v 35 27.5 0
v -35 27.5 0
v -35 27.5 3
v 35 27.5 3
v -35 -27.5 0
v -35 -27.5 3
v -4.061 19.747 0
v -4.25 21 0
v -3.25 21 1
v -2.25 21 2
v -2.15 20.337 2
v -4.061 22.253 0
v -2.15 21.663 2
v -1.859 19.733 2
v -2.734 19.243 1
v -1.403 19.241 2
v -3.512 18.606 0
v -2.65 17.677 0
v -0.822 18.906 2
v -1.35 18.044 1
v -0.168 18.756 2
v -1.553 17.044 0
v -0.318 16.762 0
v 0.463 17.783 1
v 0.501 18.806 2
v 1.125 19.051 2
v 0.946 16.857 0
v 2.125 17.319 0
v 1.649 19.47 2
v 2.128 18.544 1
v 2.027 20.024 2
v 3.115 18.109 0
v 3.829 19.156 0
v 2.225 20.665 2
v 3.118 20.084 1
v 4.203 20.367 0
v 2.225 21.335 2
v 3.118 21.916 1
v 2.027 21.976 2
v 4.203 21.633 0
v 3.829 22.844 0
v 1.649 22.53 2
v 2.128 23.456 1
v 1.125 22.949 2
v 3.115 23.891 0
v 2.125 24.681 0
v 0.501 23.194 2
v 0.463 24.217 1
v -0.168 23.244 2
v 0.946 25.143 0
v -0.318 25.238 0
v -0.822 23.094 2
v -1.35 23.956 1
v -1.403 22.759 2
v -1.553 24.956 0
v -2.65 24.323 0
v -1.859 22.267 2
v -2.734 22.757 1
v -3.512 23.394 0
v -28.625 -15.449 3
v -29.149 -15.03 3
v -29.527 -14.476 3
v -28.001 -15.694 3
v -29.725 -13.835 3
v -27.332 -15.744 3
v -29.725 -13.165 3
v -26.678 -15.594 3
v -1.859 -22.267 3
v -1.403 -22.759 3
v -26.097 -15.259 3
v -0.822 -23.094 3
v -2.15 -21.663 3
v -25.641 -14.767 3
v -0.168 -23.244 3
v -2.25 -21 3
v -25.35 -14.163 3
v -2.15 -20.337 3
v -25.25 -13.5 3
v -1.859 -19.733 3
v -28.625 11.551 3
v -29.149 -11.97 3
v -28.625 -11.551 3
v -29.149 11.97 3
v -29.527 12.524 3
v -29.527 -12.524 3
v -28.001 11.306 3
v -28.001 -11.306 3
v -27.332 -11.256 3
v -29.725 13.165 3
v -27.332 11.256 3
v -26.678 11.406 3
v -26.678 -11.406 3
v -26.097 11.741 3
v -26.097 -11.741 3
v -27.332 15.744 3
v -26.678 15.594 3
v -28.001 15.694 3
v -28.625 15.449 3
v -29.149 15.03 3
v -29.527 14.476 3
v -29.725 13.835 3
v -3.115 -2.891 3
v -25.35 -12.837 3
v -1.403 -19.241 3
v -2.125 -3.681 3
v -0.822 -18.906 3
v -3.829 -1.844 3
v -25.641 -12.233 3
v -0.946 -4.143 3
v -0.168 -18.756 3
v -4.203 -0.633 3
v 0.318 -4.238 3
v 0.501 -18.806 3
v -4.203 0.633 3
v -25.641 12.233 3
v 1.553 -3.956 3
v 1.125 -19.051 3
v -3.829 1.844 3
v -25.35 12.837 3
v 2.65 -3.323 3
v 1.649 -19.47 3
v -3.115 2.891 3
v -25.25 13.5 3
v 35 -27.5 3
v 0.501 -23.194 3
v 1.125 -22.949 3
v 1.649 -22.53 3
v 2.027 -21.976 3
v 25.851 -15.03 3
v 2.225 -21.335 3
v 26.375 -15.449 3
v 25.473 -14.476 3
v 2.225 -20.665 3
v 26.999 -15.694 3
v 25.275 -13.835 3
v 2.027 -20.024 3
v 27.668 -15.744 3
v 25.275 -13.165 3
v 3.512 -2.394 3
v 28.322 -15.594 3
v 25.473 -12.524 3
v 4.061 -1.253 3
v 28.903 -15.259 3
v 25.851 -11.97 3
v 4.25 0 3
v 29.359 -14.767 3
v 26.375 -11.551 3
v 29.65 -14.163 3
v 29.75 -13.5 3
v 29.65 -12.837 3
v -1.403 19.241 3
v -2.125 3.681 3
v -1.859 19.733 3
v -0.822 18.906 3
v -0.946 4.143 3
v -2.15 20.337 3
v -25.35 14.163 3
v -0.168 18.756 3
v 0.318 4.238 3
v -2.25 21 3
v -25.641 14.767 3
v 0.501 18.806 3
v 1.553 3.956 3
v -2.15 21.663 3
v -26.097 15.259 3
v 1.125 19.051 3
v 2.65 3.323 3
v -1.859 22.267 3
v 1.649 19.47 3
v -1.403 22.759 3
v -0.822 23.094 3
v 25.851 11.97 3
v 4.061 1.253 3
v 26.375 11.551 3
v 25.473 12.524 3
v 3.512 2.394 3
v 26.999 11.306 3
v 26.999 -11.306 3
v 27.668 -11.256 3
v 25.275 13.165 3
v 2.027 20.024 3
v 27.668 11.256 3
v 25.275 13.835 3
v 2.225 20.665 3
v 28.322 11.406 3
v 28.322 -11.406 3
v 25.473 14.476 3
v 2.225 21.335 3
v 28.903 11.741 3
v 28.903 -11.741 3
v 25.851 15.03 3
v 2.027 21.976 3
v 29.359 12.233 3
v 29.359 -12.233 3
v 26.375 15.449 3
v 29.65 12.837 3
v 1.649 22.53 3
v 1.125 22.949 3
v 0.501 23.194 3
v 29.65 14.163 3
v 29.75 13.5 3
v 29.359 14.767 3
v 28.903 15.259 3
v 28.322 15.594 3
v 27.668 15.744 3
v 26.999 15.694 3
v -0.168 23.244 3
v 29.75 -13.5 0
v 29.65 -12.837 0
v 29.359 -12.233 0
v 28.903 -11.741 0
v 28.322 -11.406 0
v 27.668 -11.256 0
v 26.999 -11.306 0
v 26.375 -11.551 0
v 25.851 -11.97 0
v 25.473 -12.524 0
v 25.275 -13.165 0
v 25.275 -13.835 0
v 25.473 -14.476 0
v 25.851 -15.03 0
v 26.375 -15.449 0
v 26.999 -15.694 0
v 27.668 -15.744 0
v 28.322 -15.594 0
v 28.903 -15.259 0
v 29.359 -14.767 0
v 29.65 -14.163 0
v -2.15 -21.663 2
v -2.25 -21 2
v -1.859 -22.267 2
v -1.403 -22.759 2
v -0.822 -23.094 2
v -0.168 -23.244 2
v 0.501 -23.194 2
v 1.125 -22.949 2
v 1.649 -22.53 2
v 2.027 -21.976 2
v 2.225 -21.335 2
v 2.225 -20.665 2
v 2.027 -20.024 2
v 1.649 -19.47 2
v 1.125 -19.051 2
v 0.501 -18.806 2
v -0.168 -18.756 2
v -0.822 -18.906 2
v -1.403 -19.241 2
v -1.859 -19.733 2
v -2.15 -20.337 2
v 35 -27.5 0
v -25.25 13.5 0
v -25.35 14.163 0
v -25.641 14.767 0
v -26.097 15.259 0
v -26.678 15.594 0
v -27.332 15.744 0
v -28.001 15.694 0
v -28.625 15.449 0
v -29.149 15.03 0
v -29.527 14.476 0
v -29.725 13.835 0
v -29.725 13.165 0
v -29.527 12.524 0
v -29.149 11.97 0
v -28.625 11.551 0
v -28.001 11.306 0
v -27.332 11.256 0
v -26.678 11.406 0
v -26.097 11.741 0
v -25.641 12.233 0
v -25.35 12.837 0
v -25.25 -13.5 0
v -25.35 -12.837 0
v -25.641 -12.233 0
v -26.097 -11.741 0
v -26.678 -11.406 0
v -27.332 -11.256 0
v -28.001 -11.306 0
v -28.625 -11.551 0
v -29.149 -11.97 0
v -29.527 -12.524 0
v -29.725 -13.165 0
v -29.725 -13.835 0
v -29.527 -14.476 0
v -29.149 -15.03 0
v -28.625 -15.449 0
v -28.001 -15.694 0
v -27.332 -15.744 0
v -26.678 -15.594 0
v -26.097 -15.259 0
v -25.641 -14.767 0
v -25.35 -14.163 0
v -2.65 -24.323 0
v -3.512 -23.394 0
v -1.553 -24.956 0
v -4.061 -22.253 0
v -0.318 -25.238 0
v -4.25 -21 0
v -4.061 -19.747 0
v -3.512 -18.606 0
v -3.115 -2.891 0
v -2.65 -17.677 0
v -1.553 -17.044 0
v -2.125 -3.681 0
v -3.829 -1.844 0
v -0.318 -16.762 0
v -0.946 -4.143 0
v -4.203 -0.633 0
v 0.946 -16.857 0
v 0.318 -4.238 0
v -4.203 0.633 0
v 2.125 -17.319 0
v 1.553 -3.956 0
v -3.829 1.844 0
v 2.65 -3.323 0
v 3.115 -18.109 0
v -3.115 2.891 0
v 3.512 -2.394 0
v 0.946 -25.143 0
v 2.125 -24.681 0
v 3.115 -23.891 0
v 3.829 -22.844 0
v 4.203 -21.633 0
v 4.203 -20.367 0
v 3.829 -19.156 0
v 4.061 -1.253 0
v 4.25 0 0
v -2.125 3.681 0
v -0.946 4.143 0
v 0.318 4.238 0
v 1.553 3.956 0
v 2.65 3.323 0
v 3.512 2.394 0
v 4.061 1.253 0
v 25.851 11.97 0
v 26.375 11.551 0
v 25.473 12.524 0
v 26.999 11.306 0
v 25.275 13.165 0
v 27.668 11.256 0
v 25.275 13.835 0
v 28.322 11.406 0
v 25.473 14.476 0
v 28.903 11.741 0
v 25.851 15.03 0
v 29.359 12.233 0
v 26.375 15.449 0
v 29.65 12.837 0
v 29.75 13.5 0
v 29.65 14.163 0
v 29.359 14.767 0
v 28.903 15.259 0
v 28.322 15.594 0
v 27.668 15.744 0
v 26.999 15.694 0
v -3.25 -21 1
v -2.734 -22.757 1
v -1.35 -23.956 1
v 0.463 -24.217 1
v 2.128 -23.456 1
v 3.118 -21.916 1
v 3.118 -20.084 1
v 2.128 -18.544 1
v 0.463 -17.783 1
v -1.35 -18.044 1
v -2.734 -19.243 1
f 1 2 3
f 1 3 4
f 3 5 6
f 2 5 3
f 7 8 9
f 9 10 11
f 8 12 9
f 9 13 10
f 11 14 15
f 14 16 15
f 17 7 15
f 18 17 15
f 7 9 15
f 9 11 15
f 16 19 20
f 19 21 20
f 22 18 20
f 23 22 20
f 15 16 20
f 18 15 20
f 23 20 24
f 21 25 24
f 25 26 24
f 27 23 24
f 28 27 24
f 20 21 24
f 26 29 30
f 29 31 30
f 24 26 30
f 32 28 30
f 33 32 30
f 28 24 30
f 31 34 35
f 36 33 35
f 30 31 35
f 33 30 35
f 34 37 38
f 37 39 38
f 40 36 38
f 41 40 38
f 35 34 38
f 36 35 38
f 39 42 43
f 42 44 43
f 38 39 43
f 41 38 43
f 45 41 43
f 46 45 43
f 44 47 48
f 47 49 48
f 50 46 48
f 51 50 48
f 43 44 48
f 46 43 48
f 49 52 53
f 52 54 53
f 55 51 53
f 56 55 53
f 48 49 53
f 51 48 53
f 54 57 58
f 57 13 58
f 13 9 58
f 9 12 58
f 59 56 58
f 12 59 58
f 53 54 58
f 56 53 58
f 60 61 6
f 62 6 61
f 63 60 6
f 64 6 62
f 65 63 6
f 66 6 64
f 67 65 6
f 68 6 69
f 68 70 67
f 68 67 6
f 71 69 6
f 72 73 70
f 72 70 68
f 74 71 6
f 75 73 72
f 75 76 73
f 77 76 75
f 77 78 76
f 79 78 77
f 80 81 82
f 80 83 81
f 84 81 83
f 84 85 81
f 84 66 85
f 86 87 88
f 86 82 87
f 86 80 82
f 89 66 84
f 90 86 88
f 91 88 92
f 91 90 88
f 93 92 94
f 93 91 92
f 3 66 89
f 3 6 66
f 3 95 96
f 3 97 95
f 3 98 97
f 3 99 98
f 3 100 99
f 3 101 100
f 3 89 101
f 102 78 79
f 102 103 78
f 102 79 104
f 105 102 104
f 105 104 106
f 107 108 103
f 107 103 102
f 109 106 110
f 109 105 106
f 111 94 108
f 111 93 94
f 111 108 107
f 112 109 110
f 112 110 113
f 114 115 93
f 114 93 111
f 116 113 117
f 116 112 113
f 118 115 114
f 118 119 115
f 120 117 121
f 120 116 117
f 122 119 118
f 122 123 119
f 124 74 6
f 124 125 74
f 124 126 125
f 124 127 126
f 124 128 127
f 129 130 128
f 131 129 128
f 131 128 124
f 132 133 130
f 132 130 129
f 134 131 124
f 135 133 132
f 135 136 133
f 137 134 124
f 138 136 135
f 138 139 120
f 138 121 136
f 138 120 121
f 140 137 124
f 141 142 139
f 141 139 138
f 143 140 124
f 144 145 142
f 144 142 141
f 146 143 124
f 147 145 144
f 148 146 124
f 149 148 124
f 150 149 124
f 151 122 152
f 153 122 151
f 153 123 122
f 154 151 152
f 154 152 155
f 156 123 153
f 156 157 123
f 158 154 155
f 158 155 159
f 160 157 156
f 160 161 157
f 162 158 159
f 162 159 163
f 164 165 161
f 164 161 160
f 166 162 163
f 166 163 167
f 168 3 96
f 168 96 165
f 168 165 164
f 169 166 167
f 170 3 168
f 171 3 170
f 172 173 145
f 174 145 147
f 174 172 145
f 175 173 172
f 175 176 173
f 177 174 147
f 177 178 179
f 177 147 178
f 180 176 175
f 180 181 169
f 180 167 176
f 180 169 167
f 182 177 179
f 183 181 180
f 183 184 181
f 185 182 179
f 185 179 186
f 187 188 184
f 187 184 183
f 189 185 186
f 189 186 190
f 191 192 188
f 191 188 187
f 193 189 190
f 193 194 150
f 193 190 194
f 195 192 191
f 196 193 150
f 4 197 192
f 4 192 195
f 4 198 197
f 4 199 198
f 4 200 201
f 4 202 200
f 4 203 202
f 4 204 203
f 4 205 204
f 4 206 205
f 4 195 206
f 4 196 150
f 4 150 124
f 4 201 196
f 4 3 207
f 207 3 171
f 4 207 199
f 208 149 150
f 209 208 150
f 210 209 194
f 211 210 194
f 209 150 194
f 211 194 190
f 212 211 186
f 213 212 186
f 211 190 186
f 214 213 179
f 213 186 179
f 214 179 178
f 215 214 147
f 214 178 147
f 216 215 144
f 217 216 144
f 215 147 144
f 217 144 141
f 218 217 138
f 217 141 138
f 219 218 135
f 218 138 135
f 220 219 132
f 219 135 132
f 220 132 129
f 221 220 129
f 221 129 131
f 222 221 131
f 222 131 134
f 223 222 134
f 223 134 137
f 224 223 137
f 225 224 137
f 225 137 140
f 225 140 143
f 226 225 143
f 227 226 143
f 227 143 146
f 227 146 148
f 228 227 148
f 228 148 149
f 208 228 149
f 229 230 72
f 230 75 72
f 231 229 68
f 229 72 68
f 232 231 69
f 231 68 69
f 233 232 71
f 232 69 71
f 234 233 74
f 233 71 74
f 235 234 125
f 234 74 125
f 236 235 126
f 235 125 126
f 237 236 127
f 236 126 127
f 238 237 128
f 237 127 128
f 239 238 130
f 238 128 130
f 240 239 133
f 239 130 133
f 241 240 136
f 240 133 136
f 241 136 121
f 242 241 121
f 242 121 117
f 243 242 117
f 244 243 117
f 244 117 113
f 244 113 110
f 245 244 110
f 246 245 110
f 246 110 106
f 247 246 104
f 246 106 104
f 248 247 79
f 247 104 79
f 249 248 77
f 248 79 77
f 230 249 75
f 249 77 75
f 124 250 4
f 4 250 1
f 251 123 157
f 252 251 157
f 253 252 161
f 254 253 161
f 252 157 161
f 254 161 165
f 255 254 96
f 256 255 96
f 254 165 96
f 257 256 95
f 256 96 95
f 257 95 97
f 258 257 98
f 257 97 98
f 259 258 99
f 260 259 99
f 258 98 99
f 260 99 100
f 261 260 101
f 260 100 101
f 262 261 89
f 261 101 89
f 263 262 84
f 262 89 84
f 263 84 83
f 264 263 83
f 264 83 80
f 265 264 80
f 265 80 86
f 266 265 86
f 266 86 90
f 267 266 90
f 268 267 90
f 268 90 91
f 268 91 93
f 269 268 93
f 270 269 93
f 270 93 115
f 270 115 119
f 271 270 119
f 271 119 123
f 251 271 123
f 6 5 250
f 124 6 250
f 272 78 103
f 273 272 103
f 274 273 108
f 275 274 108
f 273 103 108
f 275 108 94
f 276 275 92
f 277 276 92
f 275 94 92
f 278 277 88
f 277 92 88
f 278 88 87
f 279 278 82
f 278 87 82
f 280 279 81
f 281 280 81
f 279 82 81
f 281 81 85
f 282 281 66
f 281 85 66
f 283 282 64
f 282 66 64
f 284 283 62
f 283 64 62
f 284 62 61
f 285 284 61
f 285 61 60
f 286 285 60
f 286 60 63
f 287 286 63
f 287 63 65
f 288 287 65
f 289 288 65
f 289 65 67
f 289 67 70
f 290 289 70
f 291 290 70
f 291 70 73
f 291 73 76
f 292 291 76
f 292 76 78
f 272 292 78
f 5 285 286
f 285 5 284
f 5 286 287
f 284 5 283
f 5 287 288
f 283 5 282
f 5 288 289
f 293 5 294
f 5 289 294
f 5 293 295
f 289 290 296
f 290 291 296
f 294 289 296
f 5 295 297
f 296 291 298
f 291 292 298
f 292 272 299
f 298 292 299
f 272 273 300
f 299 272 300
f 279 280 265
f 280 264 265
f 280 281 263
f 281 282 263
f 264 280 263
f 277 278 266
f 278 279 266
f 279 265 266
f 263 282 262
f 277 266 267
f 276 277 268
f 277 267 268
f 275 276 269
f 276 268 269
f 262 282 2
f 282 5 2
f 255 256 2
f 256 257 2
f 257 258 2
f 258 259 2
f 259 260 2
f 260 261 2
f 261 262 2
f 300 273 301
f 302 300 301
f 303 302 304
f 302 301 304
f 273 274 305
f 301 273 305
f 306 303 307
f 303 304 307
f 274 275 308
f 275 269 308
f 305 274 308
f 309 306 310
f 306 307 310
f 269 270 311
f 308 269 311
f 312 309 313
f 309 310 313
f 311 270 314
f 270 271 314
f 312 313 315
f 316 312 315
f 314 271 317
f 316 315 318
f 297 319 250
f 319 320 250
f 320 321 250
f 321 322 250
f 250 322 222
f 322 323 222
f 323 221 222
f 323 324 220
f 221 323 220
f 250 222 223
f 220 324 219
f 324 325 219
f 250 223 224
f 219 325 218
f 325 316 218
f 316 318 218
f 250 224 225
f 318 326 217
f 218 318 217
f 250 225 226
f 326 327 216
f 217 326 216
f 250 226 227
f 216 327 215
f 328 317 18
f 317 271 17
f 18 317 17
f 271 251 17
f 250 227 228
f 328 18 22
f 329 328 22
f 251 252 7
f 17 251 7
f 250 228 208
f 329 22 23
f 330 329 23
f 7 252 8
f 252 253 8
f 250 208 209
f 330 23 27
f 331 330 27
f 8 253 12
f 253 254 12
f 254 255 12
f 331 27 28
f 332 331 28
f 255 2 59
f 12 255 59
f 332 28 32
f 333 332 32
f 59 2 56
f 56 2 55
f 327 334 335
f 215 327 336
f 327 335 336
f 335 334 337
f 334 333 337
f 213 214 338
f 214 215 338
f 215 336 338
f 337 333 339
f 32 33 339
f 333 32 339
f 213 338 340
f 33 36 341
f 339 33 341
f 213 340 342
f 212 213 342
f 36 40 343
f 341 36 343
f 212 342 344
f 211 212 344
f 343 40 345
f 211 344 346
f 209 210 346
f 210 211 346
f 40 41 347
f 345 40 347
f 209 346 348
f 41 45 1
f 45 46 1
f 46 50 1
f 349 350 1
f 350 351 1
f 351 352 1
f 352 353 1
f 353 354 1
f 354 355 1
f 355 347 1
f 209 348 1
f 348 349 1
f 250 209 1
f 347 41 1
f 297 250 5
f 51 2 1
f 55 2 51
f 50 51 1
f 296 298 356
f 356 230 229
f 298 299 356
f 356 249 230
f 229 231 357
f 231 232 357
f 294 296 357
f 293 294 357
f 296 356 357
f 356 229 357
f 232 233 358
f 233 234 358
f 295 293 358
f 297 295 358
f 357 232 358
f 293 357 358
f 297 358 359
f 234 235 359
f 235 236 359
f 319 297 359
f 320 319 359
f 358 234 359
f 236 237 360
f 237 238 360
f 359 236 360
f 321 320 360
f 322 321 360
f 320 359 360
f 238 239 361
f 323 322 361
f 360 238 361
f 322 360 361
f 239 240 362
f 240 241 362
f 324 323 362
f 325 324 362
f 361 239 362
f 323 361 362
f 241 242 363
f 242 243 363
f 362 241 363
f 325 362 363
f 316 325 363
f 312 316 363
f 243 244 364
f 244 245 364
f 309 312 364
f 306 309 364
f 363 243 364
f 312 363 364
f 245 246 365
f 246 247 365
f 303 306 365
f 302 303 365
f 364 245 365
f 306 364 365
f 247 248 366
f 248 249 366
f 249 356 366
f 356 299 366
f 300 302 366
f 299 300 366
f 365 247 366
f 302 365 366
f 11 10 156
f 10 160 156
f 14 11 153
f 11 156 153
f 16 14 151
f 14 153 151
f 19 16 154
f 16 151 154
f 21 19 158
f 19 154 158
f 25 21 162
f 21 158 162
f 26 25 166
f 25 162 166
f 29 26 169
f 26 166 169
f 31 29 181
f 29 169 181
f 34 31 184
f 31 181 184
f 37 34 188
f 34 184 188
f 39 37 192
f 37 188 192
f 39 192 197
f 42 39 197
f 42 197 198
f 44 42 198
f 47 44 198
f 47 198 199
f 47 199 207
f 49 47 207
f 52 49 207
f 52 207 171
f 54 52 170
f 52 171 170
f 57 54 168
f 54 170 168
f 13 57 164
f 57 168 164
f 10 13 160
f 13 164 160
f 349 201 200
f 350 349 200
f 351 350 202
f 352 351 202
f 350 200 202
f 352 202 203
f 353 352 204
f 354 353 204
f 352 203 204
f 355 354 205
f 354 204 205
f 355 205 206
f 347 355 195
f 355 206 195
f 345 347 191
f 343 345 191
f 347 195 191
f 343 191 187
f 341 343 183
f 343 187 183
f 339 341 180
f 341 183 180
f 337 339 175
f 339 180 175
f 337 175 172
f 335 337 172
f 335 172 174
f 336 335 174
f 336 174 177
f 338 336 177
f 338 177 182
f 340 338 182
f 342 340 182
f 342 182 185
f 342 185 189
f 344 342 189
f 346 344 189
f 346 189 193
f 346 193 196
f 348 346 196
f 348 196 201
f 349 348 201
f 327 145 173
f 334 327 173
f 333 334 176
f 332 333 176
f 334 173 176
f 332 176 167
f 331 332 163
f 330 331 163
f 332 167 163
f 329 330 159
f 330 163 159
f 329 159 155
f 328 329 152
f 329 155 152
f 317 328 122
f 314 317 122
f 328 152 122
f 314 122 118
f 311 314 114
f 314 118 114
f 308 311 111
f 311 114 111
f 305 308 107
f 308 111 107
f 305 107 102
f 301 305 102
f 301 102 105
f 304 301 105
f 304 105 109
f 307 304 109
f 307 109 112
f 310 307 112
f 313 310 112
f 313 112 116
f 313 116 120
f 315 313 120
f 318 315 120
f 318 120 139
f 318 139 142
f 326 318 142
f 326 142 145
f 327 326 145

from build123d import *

# Parameters (mm, degrees)
SKETCH_W            = 70
SKETCH_H            = 55
PAD_DEPTH           = 3
SKETCH001_R         = 2.25
HOLE_DEPTH          = 25
HOLE001_D           = 4.5
HOLE001_DEPTH       = 25
HOLE001_CSINK_D     = 8.5
HOLE001_CSINK_ANGLE = 90
SKETCH003_R         = 4.25
HOLE002_DEPTH       = 25


with BuildPart() as part:
    # Sketch → Pad (new body)
    with BuildSketch(Plane.XY):
        Rectangle(SKETCH_W, SKETCH_H)
    extrude(amount=PAD_DEPTH)

    # Sketch001 (on Face6 of Pad) → Hole (cut)
    with BuildSketch(Plane.XY.offset(3)):
        with Locations((-27.5, 13.5)):
            Circle(SKETCH001_R)
        with Locations((-27.5, -13.5)):
            Circle(SKETCH001_R)
        with Locations((27.5, 13.5)):
            Circle(SKETCH001_R)
        with Locations((27.5, -13.5)):
            Circle(SKETCH001_R)
    extrude(amount=-HOLE_DEPTH, mode=Mode.SUBTRACT)

    # Hole001
    with Locations(Plane(origin=(0, 0, 0), x_dir=(1, 0, 0), z_dir=(0, 0, -1))):
        with Locations((0, 21), (0, -21)):
            CounterSinkHole(HOLE001_D / 2, HOLE001_CSINK_D / 2, depth=HOLE001_DEPTH, counter_sink_angle=HOLE001_CSINK_ANGLE)

    # Sketch003 (on Face5 of Hole001) → Hole002 (cut)
    with BuildSketch(Plane.XY.offset(3)):
        Circle(SKETCH003_R)
    extrude(amount=-HOLE002_DEPTH, mode=Mode.SUBTRACT)


solid = part.part
